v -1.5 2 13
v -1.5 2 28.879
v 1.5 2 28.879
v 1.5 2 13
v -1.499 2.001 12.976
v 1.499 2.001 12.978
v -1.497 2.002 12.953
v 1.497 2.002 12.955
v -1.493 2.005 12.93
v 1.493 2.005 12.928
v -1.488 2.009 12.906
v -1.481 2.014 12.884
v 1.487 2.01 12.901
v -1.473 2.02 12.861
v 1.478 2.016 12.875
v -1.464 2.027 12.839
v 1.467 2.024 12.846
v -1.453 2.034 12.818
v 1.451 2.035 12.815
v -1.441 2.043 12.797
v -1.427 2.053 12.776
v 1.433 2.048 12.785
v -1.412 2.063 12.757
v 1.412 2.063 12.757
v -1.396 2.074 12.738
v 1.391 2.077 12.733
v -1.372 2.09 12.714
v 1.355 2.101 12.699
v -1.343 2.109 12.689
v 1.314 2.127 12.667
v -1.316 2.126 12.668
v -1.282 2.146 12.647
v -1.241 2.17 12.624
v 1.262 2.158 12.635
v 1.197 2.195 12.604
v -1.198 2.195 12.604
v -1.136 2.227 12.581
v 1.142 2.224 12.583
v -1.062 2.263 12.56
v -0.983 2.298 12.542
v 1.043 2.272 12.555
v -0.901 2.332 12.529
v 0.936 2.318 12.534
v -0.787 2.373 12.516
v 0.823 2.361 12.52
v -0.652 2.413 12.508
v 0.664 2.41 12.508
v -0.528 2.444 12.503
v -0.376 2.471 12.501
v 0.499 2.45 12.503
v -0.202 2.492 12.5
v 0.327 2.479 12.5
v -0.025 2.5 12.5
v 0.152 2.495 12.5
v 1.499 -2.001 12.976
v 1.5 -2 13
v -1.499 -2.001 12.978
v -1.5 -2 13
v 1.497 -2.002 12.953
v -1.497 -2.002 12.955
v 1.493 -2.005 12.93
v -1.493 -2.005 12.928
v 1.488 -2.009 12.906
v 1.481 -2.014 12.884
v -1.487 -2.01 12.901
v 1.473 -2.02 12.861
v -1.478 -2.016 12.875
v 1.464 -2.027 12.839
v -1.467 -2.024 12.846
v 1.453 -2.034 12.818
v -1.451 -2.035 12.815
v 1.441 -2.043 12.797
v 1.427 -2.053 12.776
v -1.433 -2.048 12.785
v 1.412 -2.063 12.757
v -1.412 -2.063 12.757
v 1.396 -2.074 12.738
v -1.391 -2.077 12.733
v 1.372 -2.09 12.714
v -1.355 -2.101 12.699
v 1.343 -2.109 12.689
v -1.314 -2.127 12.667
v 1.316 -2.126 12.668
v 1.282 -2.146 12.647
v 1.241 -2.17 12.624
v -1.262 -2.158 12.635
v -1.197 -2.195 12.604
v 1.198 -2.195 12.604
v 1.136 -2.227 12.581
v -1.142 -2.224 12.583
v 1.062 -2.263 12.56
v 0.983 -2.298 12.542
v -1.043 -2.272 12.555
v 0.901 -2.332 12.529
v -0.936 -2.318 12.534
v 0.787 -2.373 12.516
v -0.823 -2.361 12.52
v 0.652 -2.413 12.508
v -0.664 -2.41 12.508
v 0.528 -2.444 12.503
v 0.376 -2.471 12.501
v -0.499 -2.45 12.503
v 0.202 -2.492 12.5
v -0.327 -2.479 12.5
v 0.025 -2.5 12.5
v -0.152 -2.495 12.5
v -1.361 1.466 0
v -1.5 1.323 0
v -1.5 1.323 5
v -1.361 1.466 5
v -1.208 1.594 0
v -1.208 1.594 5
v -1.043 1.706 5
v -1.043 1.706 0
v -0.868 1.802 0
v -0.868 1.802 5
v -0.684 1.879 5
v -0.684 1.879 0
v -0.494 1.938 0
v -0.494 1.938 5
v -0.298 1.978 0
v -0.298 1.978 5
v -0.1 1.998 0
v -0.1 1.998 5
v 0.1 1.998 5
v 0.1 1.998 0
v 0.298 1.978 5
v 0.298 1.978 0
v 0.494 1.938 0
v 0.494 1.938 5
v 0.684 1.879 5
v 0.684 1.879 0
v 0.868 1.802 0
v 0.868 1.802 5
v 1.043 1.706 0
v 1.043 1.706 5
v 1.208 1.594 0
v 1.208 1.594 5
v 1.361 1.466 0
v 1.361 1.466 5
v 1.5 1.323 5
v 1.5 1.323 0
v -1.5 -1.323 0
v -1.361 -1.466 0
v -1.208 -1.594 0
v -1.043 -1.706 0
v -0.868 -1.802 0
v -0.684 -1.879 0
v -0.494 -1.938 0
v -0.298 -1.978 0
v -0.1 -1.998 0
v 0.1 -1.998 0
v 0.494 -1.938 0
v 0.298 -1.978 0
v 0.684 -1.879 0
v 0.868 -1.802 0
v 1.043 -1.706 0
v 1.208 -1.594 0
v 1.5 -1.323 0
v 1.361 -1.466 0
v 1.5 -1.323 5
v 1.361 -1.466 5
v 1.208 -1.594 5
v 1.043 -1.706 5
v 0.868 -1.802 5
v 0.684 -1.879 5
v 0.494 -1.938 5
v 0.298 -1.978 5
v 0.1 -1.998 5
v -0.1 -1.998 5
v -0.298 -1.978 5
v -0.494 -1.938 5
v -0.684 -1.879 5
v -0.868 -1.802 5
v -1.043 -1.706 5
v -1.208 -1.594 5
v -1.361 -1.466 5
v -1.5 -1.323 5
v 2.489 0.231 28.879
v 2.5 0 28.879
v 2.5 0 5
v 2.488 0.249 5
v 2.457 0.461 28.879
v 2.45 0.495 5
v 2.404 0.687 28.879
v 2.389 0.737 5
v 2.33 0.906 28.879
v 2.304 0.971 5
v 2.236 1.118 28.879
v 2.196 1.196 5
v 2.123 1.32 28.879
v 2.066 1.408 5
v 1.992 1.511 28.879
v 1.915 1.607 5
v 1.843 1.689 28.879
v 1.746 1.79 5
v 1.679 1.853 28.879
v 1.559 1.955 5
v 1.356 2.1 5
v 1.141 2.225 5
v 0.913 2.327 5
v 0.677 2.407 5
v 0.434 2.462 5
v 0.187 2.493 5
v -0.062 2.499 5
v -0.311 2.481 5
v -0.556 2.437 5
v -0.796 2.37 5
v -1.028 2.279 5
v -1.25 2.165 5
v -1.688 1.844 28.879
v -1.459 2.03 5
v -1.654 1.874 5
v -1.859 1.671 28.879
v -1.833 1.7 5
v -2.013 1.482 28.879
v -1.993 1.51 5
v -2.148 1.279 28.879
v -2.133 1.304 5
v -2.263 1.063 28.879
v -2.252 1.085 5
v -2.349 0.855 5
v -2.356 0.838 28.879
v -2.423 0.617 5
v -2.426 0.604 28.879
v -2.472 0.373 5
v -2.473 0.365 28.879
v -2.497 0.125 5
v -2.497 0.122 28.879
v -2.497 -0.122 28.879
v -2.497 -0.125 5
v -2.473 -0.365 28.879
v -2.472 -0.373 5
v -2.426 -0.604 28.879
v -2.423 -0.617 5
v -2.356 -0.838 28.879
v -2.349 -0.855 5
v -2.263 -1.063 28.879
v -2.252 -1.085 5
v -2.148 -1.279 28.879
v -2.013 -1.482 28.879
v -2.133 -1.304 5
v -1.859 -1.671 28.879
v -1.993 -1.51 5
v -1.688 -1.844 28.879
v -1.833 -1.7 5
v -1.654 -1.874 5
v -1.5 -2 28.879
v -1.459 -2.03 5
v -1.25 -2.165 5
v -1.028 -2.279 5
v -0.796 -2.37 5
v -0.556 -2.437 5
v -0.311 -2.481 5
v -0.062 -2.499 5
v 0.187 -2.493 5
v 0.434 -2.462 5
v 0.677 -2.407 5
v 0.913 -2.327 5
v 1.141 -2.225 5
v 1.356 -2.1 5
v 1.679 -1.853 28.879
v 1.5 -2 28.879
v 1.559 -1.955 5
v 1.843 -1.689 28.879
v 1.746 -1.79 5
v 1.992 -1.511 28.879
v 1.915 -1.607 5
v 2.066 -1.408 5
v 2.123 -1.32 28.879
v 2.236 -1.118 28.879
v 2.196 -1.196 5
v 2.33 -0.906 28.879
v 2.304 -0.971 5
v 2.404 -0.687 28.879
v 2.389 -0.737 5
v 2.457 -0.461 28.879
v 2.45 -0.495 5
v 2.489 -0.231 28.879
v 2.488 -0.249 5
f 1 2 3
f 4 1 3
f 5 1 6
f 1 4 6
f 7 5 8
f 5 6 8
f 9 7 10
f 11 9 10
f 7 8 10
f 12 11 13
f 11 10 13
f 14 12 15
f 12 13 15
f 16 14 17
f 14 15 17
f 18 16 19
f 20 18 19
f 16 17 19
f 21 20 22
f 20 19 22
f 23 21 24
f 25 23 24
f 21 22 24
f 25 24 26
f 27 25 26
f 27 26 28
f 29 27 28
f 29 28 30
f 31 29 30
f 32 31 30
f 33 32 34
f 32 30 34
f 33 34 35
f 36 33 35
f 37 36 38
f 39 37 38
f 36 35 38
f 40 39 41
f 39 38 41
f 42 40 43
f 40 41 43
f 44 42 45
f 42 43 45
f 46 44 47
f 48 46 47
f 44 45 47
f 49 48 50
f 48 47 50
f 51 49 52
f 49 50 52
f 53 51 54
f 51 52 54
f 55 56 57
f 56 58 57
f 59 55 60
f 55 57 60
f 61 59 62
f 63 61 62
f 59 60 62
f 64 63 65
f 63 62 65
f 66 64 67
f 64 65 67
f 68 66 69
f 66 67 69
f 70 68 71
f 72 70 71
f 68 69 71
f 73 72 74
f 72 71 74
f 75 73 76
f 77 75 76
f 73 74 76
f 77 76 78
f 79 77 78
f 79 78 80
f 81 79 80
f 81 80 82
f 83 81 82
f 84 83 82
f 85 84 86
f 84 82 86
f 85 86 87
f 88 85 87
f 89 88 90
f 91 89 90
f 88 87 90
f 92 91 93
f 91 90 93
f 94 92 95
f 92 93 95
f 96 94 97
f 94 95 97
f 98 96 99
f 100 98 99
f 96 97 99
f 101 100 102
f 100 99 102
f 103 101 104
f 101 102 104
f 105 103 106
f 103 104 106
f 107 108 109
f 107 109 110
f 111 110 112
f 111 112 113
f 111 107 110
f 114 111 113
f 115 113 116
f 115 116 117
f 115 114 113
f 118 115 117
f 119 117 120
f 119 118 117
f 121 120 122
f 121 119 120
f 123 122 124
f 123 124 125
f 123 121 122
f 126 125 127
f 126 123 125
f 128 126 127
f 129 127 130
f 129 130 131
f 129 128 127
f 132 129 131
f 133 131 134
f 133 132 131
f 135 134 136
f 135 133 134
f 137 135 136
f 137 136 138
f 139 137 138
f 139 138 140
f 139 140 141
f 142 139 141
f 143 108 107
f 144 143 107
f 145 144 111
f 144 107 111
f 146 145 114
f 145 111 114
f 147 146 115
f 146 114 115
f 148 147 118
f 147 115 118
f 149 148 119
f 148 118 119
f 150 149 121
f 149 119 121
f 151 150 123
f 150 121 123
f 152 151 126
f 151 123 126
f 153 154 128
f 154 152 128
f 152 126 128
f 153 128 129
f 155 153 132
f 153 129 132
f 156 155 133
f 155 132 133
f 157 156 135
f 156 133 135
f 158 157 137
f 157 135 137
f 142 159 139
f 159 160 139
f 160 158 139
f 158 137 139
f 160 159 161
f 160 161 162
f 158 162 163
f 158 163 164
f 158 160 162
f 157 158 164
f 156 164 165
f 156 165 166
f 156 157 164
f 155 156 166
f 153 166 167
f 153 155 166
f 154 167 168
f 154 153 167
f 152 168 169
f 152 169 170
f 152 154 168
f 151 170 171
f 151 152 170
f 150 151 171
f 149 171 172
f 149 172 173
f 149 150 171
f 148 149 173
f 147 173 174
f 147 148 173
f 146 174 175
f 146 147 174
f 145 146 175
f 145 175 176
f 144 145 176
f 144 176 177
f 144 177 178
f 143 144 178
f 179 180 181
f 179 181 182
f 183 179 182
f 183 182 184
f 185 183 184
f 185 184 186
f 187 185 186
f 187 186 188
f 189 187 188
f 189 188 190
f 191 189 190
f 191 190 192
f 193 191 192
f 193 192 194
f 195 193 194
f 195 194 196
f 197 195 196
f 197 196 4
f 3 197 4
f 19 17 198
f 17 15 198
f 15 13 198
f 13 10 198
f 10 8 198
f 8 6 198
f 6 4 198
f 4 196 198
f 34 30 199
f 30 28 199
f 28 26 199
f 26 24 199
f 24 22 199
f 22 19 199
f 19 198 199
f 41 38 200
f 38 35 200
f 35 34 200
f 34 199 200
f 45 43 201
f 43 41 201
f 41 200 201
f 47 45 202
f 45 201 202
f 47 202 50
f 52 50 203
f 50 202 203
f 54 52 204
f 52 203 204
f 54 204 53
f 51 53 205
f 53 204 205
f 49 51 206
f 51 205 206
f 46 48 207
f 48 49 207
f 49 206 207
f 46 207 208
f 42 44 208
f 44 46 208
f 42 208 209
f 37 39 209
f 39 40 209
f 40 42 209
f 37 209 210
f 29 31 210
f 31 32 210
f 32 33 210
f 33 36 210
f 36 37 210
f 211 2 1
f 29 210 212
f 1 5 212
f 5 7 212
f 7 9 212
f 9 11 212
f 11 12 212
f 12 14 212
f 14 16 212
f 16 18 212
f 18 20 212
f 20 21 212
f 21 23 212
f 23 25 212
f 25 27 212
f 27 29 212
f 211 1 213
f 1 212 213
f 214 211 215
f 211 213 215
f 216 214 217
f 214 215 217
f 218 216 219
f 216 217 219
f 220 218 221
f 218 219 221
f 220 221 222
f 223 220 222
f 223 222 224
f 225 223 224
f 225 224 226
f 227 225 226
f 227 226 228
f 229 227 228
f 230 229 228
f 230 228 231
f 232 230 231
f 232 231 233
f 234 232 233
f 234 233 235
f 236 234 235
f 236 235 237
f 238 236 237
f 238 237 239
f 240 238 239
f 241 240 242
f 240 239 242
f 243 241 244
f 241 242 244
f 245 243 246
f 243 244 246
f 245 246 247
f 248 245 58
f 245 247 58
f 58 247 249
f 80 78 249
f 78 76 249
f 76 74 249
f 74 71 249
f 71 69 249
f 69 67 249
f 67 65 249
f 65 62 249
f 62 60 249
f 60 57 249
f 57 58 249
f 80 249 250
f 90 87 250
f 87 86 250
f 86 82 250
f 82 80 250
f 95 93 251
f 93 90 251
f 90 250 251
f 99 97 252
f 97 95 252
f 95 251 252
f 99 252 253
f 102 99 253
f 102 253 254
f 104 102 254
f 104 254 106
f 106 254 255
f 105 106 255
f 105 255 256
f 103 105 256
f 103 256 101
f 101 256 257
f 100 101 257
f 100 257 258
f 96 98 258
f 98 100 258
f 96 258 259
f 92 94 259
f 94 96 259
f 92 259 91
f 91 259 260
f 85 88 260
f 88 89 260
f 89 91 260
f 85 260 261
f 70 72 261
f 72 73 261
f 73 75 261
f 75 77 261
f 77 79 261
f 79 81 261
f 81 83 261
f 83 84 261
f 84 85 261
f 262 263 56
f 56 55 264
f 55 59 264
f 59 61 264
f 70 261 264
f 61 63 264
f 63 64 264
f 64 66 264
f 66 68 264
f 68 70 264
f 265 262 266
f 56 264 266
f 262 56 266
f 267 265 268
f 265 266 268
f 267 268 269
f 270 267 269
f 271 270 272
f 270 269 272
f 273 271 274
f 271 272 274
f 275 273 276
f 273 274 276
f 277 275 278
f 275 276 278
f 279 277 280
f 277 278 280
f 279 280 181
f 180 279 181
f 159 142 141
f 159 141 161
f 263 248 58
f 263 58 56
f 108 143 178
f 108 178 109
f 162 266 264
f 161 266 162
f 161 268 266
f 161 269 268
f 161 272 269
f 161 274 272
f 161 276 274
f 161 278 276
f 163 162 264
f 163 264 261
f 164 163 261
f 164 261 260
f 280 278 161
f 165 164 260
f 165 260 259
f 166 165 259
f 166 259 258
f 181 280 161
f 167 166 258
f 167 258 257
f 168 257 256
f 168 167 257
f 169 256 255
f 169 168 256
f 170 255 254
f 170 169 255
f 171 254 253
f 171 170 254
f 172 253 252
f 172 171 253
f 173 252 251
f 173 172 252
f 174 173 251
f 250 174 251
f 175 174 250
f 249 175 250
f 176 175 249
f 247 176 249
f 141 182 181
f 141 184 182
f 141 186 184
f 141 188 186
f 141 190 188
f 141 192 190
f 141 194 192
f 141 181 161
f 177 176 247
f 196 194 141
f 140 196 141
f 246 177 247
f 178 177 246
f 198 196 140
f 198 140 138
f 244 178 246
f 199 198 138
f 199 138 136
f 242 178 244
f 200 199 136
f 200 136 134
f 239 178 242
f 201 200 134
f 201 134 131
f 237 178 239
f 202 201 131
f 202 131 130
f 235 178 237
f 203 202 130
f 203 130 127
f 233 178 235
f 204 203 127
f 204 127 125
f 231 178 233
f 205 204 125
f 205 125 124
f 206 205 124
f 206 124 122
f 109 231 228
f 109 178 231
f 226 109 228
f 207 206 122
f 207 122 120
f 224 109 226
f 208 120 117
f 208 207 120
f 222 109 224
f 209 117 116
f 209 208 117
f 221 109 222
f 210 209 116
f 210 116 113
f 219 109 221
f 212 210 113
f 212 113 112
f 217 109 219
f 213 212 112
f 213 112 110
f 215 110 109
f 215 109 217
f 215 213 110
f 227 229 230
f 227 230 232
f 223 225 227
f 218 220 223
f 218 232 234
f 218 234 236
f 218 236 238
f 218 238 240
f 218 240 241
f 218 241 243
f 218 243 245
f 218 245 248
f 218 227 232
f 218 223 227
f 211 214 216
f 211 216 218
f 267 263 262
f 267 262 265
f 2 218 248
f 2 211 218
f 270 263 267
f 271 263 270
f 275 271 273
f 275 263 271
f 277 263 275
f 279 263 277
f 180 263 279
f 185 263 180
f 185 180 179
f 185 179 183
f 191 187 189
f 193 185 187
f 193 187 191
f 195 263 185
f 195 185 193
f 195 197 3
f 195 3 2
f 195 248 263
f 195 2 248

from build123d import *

# Parameters (mm, degrees)
SKETCH1_R               = 2.5
BOSS_EXTRUDE1_DEPTH     = 28.879
SKETCH2_R               = 2.5
CUT_EXTRUDE1_DEPTH      = 5
CUT_EXTRUDE2_DEPTH      = 15.879
CUT_EXTRUDE3_DEPTH      = 3.5
CUT_EXTRUDE3_DEPTH_BACK = 3.5


with BuildPart() as part:
    # Sketch1 → Boss-Extrude1 (new body)
    with BuildSketch(Plane.XY):
        Circle(SKETCH1_R)
    extrude(amount=BOSS_EXTRUDE1_DEPTH)

    # Sketch2 → Cut-Extrude1 (cut)
    with BuildSketch(Plane(origin=(0, 0, 0), x_dir=(-1, 0, 0), z_dir=(0, 0, -1))):
        Circle(SKETCH2_R)
        with BuildLine():
            Line((-1.5, 1.322875656), (-1.5, -1.322875656))
            ThreePointArc((-1.5, -1.322875656), (0, -2), (1.5, -1.322875656))
            Line((1.5, -1.322875656), (1.5, 1.322875656))
            ThreePointArc((1.5, 1.322875656), (0, 2), (-1.5, 1.322875656))
        make_face(mode=Mode.SUBTRACT)
    extrude(amount=-CUT_EXTRUDE1_DEPTH, mode=Mode.SUBTRACT)

    # Sketch3 → Cut-Extrude2 (cut)
    with BuildSketch(Plane.XY.offset(28.879)):
        with BuildLine():
            Line((-1.5, 2), (1.5, 2))
            ThreePointArc((1.5, 2), (0, 2.5), (-1.5, 2))
        make_face()
        with BuildLine():
            Line((-1.5, -2), (1.5, -2))
            ThreePointArc((1.5, -2), (0, -2.5), (-1.5, -2))
        make_face()
    extrude(amount=-CUT_EXTRUDE2_DEPTH, mode=Mode.SUBTRACT)

    # Sketch4 → Cut-Extrude3 (cut, two sides)
    with BuildSketch(Plane(origin=(0, 0, 0), x_dir=(0, 0, -1), z_dir=(1, 0, 0))) as cut_extrude3_sk:
        with BuildLine():
            Line((-13, 2.5), (-13, 2))
            ThreePointArc((-13, 2), (-12.646446609, 2.146446609), (-12.5, 2.5))
            Line((-12.5, 2.5), (-13, 2.5))
        make_face()
        with BuildLine():
            Line((-13, -2.5), (-13, -2))
            ThreePointArc((-13, -2), (-12.646446609, -2.146446609), (-12.5, -2.5))
            Line((-12.5, -2.5), (-13, -2.5))
        make_face()
    extrude(amount=CUT_EXTRUDE3_DEPTH, mode=Mode.SUBTRACT)
    extrude(cut_extrude3_sk.sketch, amount=-CUT_EXTRUDE3_DEPTH_BACK, mode=Mode.SUBTRACT)


solid = part.part
